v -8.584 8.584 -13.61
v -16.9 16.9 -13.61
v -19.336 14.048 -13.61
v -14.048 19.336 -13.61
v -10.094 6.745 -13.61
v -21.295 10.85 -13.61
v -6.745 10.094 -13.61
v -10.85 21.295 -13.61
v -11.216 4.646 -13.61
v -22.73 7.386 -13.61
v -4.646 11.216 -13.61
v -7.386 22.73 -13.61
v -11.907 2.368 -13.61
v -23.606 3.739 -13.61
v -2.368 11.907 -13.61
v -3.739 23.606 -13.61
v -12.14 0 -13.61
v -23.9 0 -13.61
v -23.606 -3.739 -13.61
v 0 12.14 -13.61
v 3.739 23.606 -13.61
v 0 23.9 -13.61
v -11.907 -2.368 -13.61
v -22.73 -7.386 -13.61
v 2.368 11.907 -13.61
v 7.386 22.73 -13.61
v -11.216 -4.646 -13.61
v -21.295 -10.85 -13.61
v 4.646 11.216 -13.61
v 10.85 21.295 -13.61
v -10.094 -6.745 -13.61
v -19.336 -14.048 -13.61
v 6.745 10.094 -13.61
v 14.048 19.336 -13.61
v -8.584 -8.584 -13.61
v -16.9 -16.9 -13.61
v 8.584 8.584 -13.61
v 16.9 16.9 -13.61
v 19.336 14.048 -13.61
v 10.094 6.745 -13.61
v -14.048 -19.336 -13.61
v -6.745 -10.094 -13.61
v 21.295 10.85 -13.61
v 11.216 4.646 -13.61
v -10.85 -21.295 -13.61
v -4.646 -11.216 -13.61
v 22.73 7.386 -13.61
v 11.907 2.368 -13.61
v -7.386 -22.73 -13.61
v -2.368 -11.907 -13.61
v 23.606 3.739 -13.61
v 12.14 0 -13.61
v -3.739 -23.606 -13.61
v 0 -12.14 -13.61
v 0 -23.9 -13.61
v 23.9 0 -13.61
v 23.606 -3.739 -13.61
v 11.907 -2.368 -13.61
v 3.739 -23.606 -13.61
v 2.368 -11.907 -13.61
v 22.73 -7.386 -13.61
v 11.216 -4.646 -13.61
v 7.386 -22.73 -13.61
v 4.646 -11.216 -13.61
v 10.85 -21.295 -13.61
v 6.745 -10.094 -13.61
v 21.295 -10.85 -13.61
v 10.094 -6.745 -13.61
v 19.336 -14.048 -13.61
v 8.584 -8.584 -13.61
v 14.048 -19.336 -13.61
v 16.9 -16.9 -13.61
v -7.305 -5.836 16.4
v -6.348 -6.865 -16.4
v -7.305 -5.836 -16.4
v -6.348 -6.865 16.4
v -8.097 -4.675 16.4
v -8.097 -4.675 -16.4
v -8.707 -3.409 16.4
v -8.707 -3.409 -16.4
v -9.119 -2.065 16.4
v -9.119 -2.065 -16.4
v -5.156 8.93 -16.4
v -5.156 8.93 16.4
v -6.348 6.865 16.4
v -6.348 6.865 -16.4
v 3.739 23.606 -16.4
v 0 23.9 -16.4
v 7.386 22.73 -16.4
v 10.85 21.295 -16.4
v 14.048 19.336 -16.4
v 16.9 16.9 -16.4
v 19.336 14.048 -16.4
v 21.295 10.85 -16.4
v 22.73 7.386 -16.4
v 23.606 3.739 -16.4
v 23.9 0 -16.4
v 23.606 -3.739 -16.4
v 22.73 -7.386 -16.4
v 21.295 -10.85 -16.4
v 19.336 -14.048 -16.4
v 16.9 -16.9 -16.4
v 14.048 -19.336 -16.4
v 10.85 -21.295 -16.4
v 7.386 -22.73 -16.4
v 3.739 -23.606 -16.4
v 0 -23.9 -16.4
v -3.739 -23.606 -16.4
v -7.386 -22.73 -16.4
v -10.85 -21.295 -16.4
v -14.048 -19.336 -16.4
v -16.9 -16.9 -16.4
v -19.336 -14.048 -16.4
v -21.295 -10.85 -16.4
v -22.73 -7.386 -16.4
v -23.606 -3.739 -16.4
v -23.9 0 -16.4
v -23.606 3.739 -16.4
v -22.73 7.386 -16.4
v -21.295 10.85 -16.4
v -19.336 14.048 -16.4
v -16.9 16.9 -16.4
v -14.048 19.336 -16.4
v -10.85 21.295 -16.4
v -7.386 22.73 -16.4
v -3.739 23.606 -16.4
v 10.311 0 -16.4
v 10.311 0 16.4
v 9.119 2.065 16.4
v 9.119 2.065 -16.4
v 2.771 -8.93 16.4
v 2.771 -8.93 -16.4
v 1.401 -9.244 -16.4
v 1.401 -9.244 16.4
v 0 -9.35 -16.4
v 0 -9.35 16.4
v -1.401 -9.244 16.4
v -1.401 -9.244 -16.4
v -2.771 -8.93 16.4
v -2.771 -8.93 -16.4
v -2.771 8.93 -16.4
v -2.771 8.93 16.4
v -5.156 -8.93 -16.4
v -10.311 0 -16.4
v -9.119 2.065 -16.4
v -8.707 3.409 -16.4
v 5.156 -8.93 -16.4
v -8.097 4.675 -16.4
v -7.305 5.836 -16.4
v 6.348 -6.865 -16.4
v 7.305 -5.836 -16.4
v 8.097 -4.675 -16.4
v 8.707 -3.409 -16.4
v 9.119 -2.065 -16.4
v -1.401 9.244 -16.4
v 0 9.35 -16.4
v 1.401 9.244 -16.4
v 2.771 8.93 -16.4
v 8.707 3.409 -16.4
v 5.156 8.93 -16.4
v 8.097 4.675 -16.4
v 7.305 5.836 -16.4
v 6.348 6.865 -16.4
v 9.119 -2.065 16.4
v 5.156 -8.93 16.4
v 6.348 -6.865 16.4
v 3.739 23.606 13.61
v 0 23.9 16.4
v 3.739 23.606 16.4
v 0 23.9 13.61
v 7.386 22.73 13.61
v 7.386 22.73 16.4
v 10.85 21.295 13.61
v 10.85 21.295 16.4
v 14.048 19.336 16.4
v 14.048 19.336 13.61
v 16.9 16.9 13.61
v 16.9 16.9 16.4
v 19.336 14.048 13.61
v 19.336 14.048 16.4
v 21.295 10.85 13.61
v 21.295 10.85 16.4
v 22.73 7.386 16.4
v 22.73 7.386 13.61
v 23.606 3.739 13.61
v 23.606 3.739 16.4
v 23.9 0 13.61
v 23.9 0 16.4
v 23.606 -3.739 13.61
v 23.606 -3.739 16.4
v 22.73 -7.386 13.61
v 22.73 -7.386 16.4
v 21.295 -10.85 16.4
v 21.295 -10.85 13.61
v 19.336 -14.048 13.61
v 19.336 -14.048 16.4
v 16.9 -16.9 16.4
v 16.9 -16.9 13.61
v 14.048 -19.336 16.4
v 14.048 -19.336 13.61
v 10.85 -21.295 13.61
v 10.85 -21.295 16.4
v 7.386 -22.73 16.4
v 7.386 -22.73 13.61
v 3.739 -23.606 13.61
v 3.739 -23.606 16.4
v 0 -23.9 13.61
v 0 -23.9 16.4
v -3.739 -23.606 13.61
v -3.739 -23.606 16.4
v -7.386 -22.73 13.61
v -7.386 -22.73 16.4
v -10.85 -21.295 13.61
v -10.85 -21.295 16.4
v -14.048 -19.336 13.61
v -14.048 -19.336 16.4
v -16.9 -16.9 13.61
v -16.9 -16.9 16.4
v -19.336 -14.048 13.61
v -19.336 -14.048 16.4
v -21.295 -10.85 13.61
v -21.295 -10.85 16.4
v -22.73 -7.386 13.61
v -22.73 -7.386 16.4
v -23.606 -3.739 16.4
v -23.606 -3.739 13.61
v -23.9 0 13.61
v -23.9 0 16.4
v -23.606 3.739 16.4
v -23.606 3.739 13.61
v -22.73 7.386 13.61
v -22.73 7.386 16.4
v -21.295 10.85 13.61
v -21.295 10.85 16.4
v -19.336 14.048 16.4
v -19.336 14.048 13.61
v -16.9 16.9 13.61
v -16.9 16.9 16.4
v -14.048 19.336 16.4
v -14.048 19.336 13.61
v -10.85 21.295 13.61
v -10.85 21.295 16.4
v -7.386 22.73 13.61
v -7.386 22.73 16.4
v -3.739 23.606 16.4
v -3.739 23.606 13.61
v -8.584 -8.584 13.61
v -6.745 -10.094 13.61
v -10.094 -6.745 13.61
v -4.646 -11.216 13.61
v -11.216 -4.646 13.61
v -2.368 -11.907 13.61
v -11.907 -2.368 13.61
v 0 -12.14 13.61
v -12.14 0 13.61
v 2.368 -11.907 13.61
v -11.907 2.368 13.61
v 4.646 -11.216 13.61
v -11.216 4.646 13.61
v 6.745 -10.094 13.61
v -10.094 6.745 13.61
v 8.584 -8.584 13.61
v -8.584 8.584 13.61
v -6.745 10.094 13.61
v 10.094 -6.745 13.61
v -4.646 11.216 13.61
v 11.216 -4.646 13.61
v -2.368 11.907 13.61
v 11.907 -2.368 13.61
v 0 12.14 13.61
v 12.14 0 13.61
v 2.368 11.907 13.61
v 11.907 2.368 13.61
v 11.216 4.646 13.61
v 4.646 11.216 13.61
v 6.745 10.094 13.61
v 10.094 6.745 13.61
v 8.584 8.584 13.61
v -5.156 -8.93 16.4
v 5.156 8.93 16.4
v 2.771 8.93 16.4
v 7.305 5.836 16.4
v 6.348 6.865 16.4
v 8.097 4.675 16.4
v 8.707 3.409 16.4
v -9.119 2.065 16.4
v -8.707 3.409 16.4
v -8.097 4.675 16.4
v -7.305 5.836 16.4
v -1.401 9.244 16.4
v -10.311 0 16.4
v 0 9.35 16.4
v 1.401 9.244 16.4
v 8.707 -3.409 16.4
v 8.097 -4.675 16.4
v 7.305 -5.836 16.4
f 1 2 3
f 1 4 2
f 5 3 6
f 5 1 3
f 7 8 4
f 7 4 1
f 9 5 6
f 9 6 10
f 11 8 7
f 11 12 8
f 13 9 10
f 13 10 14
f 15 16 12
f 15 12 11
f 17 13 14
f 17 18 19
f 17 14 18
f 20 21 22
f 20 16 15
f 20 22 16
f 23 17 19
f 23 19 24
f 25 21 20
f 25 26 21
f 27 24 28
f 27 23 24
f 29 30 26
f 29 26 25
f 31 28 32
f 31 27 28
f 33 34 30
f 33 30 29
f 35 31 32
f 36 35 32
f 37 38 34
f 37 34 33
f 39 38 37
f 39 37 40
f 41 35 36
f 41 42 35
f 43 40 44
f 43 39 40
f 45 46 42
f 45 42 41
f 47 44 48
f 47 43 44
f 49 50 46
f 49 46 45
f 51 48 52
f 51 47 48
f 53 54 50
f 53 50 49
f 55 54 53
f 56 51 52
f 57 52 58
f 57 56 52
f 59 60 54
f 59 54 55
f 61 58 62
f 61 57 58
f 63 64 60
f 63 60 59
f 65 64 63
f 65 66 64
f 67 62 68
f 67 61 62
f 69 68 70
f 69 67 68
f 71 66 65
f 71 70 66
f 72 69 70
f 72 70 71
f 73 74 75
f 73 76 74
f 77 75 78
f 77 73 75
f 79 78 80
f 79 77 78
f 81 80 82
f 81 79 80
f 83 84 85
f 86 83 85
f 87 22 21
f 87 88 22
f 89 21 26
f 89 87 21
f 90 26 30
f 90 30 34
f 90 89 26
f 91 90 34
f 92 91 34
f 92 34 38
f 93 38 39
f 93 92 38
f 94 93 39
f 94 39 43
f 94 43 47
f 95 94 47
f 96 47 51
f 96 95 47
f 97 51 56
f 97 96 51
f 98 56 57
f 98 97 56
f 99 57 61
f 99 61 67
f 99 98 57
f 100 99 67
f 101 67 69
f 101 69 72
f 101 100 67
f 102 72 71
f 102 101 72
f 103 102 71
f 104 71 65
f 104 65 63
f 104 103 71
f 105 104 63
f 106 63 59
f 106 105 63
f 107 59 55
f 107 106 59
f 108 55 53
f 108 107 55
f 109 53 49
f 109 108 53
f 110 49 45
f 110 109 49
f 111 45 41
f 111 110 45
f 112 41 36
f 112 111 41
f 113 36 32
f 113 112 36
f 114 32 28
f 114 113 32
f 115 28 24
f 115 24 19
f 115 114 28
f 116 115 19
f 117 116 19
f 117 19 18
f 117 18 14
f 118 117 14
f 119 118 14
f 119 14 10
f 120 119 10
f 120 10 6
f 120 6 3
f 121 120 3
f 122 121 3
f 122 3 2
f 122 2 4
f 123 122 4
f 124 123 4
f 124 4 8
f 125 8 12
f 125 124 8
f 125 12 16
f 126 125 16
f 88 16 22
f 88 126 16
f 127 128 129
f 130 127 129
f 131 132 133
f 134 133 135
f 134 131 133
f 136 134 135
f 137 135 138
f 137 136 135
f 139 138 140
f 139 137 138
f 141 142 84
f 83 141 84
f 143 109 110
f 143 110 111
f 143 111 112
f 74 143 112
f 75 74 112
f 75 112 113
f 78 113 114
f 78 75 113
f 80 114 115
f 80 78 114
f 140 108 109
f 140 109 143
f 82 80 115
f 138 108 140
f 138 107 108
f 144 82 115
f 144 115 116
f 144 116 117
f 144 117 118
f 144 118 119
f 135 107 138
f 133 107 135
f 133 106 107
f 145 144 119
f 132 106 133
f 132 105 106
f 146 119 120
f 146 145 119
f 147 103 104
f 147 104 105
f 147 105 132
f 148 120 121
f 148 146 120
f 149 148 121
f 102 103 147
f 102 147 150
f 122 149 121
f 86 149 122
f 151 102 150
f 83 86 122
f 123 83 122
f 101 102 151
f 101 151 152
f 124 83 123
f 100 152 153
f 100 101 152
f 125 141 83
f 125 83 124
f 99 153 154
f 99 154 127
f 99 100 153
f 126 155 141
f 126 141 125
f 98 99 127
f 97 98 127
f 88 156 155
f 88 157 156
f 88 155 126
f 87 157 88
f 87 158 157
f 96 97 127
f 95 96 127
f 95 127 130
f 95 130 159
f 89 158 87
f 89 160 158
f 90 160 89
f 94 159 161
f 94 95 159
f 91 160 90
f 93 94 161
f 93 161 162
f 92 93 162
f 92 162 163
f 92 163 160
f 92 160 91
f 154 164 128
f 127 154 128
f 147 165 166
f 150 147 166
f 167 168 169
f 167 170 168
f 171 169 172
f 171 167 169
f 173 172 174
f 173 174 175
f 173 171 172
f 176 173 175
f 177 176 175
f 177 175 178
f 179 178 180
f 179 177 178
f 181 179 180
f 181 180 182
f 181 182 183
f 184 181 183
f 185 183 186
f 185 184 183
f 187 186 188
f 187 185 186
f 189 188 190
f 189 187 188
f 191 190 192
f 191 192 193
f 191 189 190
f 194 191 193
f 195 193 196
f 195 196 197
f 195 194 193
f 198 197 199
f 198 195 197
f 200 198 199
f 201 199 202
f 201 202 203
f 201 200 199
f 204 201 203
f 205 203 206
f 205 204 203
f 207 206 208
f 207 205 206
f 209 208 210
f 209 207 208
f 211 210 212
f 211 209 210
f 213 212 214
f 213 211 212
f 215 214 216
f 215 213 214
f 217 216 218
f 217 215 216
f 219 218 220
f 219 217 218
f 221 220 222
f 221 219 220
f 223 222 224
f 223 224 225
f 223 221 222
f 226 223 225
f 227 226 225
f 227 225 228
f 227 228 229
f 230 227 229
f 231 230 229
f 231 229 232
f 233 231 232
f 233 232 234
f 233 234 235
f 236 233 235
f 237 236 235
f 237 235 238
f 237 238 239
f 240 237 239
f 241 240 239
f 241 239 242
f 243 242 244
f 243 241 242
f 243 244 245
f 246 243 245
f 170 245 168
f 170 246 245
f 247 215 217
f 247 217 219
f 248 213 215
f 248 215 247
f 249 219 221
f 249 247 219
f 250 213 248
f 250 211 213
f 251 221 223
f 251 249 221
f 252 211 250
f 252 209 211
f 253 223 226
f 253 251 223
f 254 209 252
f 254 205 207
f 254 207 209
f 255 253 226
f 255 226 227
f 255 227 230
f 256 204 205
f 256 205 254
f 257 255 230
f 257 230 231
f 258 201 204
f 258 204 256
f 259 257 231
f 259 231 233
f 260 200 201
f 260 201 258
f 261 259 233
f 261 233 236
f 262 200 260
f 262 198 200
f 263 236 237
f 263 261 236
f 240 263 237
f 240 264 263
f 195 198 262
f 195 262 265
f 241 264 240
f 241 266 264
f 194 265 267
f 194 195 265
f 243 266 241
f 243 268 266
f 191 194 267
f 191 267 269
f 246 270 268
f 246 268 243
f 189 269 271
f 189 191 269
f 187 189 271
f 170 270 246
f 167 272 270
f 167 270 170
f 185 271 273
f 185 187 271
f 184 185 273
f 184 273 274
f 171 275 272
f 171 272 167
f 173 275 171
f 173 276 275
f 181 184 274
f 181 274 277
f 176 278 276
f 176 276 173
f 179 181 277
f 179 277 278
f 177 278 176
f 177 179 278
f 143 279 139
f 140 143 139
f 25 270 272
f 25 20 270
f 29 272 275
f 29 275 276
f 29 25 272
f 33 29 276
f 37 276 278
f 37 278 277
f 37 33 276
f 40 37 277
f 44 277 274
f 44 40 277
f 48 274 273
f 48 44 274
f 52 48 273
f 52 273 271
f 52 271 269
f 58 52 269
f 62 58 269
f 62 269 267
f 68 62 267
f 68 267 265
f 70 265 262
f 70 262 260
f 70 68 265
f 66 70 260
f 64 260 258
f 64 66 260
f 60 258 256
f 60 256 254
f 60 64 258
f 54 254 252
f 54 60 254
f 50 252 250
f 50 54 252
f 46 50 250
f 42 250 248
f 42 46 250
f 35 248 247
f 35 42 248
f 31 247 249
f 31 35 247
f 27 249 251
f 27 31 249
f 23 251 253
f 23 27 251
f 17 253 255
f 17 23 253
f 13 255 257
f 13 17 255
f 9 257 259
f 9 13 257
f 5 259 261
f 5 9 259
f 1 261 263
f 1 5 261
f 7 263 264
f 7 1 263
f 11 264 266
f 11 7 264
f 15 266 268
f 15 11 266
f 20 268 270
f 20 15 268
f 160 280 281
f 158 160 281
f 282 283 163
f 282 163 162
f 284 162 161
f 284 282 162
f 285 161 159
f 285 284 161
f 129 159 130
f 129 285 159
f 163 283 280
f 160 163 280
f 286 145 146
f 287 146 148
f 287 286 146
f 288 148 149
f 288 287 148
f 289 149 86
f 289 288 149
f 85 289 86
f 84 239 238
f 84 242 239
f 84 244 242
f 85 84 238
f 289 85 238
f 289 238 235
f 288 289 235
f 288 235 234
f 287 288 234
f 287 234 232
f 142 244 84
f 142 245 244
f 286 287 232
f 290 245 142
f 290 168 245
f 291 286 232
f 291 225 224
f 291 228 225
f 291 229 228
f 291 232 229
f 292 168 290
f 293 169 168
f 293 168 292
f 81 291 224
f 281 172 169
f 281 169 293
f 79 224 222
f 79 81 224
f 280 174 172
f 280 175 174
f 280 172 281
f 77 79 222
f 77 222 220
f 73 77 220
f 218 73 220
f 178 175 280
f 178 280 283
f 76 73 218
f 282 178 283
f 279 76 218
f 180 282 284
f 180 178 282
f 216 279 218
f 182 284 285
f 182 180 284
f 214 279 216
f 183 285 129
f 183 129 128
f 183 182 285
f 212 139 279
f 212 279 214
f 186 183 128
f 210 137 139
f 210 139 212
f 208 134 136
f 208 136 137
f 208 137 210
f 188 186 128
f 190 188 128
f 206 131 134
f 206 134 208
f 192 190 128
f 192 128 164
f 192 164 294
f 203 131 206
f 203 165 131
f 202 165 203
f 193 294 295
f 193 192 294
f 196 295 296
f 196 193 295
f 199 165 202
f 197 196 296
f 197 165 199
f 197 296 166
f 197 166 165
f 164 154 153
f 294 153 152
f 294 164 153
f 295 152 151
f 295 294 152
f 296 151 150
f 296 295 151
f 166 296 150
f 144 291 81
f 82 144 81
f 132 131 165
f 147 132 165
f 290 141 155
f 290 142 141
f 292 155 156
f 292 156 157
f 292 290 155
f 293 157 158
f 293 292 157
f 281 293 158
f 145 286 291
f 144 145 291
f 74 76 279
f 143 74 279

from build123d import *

# Parameters (mm, degrees)
CUT_EXTRUDE1_DEPTH = 33.8


with BuildPart() as part:
    # Sketch1 → Revolve1 (revolve)
    with BuildSketch(Plane(origin=(0, 0, 0), x_dir=(0, 0, -1), z_dir=(1, 0, 0))):
        Polygon((-13.61, 23.9), (-13.61, 12.14), (13.61, 12.14), (13.61, 23.9), (16.4, 23.9), (16.4, 9.35), (-16.4, 9.35), (-16.4, 23.9), align=None)
    revolve(axis=Axis((0, 0, 33.448920863), (0, 0, -1)))

    # Sketch2 → Cut-Extrude1 (cut, through all)
    with BuildSketch(Plane.XY.offset(16.4)):
        Polygon((5.155737904, 8.93), (-5.155737904, 8.93), (-10.311475808, 0), (-5.155737904, -8.93), (5.155737904, -8.93), (10.311475808, 0), align=None)
    extrude(amount=-CUT_EXTRUDE1_DEPTH, mode=Mode.SUBTRACT)


solid = part.part
